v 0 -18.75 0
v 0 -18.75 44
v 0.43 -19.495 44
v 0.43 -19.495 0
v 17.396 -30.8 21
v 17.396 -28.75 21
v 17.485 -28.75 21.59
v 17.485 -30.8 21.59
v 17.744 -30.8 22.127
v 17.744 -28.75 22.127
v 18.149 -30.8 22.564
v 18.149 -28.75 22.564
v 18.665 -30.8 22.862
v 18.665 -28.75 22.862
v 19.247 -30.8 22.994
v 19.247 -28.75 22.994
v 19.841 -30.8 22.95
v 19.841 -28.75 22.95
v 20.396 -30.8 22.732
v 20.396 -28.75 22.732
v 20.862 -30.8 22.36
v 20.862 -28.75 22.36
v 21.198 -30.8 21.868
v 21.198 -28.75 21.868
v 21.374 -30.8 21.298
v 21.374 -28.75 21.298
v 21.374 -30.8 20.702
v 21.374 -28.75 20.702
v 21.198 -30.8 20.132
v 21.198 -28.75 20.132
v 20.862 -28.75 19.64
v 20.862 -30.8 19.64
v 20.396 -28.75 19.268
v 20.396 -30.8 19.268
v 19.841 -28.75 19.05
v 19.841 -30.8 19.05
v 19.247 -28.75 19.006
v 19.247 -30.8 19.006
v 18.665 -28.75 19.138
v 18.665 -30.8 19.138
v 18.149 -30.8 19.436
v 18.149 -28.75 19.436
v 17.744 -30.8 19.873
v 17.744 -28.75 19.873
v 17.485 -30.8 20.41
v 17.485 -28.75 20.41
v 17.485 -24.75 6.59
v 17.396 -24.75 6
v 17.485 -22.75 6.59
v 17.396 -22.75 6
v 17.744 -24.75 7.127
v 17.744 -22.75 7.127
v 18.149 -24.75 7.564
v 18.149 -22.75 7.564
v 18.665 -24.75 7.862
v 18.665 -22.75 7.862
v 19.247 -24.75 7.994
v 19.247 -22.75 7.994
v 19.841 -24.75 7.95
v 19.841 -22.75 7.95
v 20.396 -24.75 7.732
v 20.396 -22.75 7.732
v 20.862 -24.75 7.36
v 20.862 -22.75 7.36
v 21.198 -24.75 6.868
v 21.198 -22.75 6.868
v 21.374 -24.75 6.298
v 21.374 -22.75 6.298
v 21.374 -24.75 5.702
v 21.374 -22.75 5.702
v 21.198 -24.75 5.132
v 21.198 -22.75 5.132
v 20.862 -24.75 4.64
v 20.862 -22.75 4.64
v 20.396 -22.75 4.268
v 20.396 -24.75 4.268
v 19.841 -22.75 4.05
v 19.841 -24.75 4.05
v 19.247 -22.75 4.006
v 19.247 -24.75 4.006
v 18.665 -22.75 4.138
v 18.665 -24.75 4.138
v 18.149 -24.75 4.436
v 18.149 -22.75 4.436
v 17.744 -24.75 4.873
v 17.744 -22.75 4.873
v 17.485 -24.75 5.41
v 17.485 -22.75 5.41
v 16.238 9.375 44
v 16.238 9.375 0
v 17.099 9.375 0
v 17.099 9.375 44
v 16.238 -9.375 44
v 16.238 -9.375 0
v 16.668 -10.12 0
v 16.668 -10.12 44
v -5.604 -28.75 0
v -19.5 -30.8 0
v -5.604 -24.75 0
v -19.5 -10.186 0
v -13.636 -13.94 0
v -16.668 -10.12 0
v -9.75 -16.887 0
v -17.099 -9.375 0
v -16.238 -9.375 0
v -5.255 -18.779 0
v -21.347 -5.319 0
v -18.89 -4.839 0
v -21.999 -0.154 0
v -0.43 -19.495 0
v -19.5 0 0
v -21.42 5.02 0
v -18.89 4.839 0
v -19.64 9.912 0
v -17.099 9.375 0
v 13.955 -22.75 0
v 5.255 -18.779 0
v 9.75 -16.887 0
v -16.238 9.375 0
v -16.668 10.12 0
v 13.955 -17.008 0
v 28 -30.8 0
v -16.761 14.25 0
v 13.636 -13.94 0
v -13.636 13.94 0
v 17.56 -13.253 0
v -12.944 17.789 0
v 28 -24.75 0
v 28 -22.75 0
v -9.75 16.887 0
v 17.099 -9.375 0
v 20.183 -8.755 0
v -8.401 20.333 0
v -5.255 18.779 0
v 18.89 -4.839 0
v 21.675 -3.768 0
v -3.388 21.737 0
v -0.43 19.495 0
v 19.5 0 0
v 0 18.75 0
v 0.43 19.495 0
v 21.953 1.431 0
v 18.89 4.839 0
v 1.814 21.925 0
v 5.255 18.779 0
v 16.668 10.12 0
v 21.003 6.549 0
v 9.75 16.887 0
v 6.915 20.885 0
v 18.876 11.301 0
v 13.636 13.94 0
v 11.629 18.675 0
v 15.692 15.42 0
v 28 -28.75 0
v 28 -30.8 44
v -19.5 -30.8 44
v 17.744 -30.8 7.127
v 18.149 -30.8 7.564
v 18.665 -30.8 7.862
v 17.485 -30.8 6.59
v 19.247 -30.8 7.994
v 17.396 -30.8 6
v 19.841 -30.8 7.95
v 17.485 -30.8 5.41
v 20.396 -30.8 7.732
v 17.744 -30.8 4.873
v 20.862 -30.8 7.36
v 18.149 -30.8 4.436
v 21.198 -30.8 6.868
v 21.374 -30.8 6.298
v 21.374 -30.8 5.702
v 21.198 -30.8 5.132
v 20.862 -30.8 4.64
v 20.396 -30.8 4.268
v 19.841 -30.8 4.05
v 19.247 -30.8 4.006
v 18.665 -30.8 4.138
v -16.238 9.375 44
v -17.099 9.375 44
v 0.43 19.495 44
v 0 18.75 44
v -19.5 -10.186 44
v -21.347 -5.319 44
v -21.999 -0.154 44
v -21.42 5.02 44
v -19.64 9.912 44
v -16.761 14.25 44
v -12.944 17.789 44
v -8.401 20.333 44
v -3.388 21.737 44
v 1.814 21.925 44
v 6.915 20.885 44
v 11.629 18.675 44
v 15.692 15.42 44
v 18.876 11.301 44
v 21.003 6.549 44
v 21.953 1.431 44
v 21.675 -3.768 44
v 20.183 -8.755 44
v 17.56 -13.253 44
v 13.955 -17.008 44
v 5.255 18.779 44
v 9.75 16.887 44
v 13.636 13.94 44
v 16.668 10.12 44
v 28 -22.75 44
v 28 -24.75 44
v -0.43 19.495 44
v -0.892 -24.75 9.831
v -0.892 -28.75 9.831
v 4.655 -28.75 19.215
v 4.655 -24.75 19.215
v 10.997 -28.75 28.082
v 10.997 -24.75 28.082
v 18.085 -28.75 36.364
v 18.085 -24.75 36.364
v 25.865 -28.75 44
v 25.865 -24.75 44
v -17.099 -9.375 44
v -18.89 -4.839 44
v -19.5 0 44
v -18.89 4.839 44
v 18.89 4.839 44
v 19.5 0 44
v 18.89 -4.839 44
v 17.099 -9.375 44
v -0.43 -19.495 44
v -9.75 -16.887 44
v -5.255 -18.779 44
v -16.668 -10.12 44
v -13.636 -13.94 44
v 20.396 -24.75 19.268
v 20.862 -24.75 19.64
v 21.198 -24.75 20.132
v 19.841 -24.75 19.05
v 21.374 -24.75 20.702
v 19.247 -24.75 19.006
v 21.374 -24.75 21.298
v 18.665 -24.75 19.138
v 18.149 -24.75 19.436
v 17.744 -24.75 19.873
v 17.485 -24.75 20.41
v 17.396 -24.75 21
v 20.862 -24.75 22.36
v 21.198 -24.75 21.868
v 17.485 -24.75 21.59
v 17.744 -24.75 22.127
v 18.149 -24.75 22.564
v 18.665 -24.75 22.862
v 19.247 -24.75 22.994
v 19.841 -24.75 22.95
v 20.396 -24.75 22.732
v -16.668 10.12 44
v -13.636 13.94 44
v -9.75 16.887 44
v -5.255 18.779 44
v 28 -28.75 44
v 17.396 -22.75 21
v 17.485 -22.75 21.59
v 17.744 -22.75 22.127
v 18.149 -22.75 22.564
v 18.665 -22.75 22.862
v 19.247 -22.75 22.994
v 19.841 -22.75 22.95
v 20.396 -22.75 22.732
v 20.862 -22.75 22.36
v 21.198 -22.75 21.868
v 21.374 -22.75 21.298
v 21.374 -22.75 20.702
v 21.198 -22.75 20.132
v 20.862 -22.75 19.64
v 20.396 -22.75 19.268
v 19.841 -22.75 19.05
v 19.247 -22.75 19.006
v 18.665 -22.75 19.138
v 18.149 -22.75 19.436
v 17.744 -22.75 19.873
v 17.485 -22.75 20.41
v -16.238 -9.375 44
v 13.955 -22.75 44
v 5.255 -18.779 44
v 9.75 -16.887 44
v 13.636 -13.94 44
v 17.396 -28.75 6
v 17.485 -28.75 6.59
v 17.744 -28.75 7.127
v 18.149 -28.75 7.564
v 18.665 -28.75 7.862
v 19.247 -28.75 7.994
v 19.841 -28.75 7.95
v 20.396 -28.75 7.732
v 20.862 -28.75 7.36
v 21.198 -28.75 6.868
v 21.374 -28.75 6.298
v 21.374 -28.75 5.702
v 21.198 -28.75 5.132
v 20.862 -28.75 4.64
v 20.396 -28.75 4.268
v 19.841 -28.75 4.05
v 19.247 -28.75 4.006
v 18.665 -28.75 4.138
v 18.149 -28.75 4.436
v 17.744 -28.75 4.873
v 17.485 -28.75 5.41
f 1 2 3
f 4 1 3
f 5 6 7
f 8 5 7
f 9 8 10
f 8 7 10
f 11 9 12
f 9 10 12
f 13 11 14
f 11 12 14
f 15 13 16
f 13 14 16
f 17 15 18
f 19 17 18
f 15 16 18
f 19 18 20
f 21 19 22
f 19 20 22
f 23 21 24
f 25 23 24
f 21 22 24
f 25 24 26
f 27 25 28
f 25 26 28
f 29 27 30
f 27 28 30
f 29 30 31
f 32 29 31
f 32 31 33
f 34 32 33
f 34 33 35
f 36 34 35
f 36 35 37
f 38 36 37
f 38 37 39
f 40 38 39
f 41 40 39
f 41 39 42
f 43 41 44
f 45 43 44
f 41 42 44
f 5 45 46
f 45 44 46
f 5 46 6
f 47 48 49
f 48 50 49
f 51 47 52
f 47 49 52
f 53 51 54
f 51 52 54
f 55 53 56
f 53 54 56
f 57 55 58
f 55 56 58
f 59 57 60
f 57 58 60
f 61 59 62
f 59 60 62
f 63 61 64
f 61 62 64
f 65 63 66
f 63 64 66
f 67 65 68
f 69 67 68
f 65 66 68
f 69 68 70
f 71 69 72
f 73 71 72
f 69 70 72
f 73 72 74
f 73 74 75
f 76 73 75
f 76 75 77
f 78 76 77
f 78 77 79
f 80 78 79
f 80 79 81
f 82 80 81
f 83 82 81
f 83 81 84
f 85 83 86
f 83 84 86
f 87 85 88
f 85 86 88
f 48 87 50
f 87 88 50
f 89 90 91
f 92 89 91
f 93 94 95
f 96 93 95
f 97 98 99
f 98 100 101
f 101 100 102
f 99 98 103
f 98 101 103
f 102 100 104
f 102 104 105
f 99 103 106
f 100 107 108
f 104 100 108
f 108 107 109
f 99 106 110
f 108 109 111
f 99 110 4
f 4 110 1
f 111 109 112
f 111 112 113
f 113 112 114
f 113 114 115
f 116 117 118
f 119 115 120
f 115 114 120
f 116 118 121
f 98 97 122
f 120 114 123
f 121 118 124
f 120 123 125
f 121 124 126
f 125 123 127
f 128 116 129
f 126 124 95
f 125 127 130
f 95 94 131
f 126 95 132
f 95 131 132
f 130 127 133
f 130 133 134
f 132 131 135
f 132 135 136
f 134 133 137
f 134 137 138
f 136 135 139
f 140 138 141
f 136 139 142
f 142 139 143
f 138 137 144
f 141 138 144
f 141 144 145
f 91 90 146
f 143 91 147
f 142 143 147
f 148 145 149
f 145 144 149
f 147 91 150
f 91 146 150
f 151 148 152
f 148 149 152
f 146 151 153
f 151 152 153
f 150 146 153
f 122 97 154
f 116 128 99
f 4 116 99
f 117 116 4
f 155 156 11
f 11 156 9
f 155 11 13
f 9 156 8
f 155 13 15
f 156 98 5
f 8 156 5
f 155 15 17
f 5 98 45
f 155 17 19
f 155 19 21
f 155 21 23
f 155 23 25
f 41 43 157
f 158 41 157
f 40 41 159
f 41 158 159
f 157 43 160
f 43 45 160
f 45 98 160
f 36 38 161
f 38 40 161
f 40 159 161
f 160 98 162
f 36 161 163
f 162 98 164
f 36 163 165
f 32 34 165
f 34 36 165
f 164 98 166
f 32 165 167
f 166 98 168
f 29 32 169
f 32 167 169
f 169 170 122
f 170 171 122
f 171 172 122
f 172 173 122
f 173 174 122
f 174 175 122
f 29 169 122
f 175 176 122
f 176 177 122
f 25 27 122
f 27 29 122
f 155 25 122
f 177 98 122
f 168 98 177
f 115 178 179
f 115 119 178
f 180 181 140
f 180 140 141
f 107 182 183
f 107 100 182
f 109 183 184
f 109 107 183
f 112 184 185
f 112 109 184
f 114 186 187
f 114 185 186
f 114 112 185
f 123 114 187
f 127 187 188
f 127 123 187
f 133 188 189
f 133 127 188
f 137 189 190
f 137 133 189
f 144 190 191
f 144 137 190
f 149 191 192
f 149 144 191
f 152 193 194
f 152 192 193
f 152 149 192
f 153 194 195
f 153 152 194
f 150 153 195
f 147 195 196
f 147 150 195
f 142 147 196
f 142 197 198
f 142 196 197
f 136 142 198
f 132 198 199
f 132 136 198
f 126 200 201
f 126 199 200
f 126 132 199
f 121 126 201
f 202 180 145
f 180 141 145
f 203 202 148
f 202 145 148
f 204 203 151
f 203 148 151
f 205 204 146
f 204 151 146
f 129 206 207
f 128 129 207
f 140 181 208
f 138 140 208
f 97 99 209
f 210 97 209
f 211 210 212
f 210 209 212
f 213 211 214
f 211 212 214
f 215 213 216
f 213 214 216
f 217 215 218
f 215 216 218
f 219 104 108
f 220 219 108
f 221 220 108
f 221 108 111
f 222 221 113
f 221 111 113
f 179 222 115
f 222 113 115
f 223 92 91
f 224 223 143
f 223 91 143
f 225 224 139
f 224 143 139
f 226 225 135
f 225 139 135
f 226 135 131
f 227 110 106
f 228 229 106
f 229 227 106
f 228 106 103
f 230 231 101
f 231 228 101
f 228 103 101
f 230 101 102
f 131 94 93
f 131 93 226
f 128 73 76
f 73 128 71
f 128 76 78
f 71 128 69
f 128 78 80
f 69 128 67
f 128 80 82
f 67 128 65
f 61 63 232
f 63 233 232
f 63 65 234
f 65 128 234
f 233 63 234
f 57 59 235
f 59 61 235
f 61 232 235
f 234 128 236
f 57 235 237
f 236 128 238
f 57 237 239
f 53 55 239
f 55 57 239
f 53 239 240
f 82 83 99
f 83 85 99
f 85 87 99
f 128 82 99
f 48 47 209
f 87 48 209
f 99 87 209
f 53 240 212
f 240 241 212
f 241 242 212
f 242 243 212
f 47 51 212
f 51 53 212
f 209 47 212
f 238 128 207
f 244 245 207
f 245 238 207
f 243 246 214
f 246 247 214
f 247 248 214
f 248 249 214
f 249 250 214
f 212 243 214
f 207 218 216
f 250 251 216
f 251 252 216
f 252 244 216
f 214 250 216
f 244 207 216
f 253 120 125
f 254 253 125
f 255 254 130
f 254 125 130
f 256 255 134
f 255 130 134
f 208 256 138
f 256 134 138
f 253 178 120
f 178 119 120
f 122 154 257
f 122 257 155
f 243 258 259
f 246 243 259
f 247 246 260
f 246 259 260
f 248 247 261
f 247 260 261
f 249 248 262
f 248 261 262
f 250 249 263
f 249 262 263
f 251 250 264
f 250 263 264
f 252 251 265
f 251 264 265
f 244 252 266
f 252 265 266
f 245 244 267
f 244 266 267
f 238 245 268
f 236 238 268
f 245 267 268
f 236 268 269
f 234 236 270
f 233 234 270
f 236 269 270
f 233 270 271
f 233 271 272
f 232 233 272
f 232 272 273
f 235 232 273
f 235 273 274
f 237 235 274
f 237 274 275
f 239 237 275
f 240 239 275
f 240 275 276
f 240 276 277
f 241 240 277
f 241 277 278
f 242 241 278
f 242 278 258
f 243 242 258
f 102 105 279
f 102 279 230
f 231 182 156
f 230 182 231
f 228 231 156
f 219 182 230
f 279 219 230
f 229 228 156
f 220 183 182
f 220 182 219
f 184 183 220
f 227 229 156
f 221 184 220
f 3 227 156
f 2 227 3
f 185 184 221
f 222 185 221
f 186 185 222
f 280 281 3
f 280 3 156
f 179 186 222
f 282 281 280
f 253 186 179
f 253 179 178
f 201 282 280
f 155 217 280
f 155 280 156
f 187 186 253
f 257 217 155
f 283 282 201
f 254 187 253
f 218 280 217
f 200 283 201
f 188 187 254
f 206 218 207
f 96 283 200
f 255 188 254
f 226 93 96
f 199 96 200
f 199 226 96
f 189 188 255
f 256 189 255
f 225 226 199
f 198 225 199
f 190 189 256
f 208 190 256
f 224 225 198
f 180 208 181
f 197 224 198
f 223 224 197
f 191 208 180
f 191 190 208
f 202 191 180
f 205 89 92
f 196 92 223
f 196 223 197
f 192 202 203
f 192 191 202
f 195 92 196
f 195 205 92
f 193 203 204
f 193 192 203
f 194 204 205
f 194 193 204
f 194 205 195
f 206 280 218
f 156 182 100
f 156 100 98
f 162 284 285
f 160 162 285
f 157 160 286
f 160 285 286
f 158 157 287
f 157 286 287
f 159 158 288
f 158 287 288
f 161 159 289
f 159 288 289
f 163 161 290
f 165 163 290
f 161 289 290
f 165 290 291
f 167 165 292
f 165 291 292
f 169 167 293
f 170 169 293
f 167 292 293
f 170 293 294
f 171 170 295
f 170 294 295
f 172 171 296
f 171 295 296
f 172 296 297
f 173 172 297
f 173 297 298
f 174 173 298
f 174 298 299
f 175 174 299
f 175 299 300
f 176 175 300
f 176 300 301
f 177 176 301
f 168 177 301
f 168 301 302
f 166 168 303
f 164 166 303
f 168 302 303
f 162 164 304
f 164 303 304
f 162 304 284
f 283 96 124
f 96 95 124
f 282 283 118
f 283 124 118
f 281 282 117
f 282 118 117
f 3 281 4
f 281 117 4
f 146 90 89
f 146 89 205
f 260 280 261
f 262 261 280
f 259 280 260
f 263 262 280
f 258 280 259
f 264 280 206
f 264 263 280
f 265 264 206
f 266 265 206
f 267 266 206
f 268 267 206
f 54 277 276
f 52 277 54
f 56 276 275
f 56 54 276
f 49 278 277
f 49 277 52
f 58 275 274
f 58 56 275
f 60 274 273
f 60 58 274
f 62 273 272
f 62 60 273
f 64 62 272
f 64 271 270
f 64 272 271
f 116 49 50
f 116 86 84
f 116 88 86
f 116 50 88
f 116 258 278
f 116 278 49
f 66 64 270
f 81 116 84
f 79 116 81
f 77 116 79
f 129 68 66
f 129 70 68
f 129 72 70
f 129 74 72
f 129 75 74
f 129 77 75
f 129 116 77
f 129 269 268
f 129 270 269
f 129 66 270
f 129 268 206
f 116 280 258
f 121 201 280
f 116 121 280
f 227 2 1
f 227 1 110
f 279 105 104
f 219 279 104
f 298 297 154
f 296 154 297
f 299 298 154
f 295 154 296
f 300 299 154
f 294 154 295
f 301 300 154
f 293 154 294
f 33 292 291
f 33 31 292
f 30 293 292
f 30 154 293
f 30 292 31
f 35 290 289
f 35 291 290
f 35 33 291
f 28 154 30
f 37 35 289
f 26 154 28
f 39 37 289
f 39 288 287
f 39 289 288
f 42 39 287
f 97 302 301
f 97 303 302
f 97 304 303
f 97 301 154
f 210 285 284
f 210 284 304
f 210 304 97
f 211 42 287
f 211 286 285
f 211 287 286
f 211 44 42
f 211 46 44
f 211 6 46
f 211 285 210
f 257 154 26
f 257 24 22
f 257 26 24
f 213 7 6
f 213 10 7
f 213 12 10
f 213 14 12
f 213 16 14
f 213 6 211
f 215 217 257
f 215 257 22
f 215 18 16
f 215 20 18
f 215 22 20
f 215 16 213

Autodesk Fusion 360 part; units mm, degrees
sketch "Boceto1" plane through (0, 0, 0) normal (0, 0, 1) x (1, 0, 0)
  circle A0 centre (0, 0) radius 19.5 construction
  line L0 (0, 0) -> (0, 18.75) construction
  line L1 (0, 18.75) -> (0.4305, 19.4952)
  line L2 (0, 18.75) -> (0.8606, 18.75) construction
  line L3 (0, 18.75) -> (-0.4305, 19.4952)
  line L4 (0, 18.75) -> (0.8606, 18.75) construction
  line L5 (-16.238, 9.375) -> (-17.0986, 9.3748)
  line L6 (-16.238, 9.375) -> (-16.6681, 10.1204)
  line L7 (-16.238, -9.375) -> (-16.6681, -10.1204)
  line L8 (-16.238, -9.375) -> (-17.0986, -9.3748)
  line L9 (0, -18.75) -> (0.4305, -19.4952)
  line L10 (0, -18.75) -> (-0.4305, -19.4952)
  line L11 (16.238, -9.375) -> (17.0986, -9.3748)
  line L12 (16.238, -9.375) -> (16.6681, -10.1204)
  line L13 (16.238, 9.375) -> (16.6681, 10.1204)
  line L14 (16.238, 9.375) -> (17.0986, 9.3748)
  circle A1 centre (0, 0) radius 19.5
  line L15 (0, 0) -> (0, -24.75) construction
  line L16 (0, 0) -> (0, -19.5) construction
  line L17 (0, 0) -> (19.5, 0) construction
  line L18 (0, -24.75) -> (-36.4194, -24.75) construction
  line L19 (-36.4194, -24.75) -> (0, -24.75) construction
  line L20 (30.7797, -24.75) -> (0, -24.75) construction
  line L21 (0, 0) -> (-19.5, 0) construction
  line L22 (-19.5, 0) -> (-19.5, -28.8)
  line L23 (0, 0) -> (19.396, 0) construction
  line L24 (19.396, 0) -> (19.396, -26.75) construction
  line L25 (19.396, -26.75) -> (21.396, -26.75) construction
  line L26 (19.396, -26.75) -> (17.396, -26.75) construction
  line L27 (13.9548, -13.6203) -> (13.9548, -24.75)
  arc A2 (13.926, -17.0313) -> (-19.4752, -10.2331) centre (0, 0) ccw
  line L28 (-19.5, -28.8) -> (-19.5, -30.8)
  line L29 (-19.5, -30.8) -> (28, -30.8)
  line L30 (13.9548, -24.75) -> (13.9548, -22.75)
  line L31 (13.9548, -22.75) -> (28, -22.75)
  line L32 (28, -22.75) -> (28, -30.8)
  line L33 (17.396, -26.75) -> (-6, -26.75) construction
  line L34 (0, 0) -> (0, -26.75) construction
  dimension "d1" = 39
  dimension "d2" = 18.75
  dimension "d3" = 59.988
  dimension "d4" = 0.8606
  dimension "d5" = 120.012
  dimension "d6" = 0.8606
  dimension "d8" = 360
  dimension "d9" = 39
  dimension "d10" = 24.75
  dimension "d13" = 19.5
  dimension "d14" = 28.8
  dimension "d15" = 19.396
  dimension "d16" = 26.75
  dimension "d17" = 2
  dimension "d18" = 2
  dimension "d19" = 11.1297
  dimension "d20" = 22
  dimension "d21" = 2
  dimension "d22" = 2
extrude "Extruir1" add sketch "Boceto1" along normal blind 44 contours L1 L3 A1 | A1 L22 L27 A2 | L13 L14 A1 | L5 L6 A1 | A1 L22 L27 L28 L29 L31 L32 | L11 L12 A1 | L7 L8 A1 | L9 L10 A1 makes body 1
sketch "Boceto2" plane through (0, -22.75, 0) normal (0, 1, 0) x (-1, 0, 0)
  line L0 (-28, 0) -> (-13.9548, 0)
  line L1 (-13.9548, 44) -> (-28, 44)
  line L2 (0, 0) -> (0, 21) construction
  line L3 (0, 21) -> (-19.396, 21) construction
  circle A0 centre (-19.396, 21) radius 2
  line L4 (-19.396, 21) -> (-19.396, 6) construction
  circle A1 centre (-19.396, 6) radius 2
  line L5 (-19.396, 6) -> (2.854, 6) construction
  line L6 (-19.396, 6) -> (-19.396, 0) construction
  line L7 (-19.396, 0) -> (5.604, 0) construction
  line L8 (-19.396, 6) -> (-19.396, 37.747) construction
  arc A2 (5.604, 0) -> (-29.313, 46.9893) centre (-109.7168, -49.2252) ccw
  line L9 (-109.7168, -49.2252) -> (5.604, 0) construction
  line L10 (-109.7168, -49.2252) -> (-29.313, 46.9893) construction
  line L11 (-29.313, 46.9893) -> (-29.313, 0)
  line L12 (-29.313, 0) -> (5.604, 0)
  dimension "d25" = 21
  dimension "d26" = 19.396
  dimension "d27" = 4
  dimension "d28" = 15
  dimension "d29" = 4
  dimension "d36" = 22.25
  dimension "d37" = 25
  dimension "d38" = 31.747
  dimension "d39" = 27
extrude "Extruir2" cut sketch "Boceto2" against normal blind 8.05 contours A0 | A1 bodies 1
ref_plane "PlanoDeObra1" through (0, -26.75, 0) normal (0, 1, 0) x (0, 0, 1)
sketch "Boceto3" plane through (0, -26.75, 0) normal (0, 1, 0) x (1, 0, 0)
  line L0 (0, 0) -> (19.792, 0) construction
  line L1 (19.792, 0) -> (-5.208, 0) construction
  dimension "d33" = 19.792
  dimension "d34" = 25
extrude "Extruir3" add sketch "Boceto2" against normal blind 4 separate body makes body 2
move_body "Desplazar1" bodies 2 to x (1, 0, 0) y (0, 1, 0) z (0, 0, 1) at (0, -2, 0)
combine "Combinar1" operation cut target body 1 tool bodies 2
